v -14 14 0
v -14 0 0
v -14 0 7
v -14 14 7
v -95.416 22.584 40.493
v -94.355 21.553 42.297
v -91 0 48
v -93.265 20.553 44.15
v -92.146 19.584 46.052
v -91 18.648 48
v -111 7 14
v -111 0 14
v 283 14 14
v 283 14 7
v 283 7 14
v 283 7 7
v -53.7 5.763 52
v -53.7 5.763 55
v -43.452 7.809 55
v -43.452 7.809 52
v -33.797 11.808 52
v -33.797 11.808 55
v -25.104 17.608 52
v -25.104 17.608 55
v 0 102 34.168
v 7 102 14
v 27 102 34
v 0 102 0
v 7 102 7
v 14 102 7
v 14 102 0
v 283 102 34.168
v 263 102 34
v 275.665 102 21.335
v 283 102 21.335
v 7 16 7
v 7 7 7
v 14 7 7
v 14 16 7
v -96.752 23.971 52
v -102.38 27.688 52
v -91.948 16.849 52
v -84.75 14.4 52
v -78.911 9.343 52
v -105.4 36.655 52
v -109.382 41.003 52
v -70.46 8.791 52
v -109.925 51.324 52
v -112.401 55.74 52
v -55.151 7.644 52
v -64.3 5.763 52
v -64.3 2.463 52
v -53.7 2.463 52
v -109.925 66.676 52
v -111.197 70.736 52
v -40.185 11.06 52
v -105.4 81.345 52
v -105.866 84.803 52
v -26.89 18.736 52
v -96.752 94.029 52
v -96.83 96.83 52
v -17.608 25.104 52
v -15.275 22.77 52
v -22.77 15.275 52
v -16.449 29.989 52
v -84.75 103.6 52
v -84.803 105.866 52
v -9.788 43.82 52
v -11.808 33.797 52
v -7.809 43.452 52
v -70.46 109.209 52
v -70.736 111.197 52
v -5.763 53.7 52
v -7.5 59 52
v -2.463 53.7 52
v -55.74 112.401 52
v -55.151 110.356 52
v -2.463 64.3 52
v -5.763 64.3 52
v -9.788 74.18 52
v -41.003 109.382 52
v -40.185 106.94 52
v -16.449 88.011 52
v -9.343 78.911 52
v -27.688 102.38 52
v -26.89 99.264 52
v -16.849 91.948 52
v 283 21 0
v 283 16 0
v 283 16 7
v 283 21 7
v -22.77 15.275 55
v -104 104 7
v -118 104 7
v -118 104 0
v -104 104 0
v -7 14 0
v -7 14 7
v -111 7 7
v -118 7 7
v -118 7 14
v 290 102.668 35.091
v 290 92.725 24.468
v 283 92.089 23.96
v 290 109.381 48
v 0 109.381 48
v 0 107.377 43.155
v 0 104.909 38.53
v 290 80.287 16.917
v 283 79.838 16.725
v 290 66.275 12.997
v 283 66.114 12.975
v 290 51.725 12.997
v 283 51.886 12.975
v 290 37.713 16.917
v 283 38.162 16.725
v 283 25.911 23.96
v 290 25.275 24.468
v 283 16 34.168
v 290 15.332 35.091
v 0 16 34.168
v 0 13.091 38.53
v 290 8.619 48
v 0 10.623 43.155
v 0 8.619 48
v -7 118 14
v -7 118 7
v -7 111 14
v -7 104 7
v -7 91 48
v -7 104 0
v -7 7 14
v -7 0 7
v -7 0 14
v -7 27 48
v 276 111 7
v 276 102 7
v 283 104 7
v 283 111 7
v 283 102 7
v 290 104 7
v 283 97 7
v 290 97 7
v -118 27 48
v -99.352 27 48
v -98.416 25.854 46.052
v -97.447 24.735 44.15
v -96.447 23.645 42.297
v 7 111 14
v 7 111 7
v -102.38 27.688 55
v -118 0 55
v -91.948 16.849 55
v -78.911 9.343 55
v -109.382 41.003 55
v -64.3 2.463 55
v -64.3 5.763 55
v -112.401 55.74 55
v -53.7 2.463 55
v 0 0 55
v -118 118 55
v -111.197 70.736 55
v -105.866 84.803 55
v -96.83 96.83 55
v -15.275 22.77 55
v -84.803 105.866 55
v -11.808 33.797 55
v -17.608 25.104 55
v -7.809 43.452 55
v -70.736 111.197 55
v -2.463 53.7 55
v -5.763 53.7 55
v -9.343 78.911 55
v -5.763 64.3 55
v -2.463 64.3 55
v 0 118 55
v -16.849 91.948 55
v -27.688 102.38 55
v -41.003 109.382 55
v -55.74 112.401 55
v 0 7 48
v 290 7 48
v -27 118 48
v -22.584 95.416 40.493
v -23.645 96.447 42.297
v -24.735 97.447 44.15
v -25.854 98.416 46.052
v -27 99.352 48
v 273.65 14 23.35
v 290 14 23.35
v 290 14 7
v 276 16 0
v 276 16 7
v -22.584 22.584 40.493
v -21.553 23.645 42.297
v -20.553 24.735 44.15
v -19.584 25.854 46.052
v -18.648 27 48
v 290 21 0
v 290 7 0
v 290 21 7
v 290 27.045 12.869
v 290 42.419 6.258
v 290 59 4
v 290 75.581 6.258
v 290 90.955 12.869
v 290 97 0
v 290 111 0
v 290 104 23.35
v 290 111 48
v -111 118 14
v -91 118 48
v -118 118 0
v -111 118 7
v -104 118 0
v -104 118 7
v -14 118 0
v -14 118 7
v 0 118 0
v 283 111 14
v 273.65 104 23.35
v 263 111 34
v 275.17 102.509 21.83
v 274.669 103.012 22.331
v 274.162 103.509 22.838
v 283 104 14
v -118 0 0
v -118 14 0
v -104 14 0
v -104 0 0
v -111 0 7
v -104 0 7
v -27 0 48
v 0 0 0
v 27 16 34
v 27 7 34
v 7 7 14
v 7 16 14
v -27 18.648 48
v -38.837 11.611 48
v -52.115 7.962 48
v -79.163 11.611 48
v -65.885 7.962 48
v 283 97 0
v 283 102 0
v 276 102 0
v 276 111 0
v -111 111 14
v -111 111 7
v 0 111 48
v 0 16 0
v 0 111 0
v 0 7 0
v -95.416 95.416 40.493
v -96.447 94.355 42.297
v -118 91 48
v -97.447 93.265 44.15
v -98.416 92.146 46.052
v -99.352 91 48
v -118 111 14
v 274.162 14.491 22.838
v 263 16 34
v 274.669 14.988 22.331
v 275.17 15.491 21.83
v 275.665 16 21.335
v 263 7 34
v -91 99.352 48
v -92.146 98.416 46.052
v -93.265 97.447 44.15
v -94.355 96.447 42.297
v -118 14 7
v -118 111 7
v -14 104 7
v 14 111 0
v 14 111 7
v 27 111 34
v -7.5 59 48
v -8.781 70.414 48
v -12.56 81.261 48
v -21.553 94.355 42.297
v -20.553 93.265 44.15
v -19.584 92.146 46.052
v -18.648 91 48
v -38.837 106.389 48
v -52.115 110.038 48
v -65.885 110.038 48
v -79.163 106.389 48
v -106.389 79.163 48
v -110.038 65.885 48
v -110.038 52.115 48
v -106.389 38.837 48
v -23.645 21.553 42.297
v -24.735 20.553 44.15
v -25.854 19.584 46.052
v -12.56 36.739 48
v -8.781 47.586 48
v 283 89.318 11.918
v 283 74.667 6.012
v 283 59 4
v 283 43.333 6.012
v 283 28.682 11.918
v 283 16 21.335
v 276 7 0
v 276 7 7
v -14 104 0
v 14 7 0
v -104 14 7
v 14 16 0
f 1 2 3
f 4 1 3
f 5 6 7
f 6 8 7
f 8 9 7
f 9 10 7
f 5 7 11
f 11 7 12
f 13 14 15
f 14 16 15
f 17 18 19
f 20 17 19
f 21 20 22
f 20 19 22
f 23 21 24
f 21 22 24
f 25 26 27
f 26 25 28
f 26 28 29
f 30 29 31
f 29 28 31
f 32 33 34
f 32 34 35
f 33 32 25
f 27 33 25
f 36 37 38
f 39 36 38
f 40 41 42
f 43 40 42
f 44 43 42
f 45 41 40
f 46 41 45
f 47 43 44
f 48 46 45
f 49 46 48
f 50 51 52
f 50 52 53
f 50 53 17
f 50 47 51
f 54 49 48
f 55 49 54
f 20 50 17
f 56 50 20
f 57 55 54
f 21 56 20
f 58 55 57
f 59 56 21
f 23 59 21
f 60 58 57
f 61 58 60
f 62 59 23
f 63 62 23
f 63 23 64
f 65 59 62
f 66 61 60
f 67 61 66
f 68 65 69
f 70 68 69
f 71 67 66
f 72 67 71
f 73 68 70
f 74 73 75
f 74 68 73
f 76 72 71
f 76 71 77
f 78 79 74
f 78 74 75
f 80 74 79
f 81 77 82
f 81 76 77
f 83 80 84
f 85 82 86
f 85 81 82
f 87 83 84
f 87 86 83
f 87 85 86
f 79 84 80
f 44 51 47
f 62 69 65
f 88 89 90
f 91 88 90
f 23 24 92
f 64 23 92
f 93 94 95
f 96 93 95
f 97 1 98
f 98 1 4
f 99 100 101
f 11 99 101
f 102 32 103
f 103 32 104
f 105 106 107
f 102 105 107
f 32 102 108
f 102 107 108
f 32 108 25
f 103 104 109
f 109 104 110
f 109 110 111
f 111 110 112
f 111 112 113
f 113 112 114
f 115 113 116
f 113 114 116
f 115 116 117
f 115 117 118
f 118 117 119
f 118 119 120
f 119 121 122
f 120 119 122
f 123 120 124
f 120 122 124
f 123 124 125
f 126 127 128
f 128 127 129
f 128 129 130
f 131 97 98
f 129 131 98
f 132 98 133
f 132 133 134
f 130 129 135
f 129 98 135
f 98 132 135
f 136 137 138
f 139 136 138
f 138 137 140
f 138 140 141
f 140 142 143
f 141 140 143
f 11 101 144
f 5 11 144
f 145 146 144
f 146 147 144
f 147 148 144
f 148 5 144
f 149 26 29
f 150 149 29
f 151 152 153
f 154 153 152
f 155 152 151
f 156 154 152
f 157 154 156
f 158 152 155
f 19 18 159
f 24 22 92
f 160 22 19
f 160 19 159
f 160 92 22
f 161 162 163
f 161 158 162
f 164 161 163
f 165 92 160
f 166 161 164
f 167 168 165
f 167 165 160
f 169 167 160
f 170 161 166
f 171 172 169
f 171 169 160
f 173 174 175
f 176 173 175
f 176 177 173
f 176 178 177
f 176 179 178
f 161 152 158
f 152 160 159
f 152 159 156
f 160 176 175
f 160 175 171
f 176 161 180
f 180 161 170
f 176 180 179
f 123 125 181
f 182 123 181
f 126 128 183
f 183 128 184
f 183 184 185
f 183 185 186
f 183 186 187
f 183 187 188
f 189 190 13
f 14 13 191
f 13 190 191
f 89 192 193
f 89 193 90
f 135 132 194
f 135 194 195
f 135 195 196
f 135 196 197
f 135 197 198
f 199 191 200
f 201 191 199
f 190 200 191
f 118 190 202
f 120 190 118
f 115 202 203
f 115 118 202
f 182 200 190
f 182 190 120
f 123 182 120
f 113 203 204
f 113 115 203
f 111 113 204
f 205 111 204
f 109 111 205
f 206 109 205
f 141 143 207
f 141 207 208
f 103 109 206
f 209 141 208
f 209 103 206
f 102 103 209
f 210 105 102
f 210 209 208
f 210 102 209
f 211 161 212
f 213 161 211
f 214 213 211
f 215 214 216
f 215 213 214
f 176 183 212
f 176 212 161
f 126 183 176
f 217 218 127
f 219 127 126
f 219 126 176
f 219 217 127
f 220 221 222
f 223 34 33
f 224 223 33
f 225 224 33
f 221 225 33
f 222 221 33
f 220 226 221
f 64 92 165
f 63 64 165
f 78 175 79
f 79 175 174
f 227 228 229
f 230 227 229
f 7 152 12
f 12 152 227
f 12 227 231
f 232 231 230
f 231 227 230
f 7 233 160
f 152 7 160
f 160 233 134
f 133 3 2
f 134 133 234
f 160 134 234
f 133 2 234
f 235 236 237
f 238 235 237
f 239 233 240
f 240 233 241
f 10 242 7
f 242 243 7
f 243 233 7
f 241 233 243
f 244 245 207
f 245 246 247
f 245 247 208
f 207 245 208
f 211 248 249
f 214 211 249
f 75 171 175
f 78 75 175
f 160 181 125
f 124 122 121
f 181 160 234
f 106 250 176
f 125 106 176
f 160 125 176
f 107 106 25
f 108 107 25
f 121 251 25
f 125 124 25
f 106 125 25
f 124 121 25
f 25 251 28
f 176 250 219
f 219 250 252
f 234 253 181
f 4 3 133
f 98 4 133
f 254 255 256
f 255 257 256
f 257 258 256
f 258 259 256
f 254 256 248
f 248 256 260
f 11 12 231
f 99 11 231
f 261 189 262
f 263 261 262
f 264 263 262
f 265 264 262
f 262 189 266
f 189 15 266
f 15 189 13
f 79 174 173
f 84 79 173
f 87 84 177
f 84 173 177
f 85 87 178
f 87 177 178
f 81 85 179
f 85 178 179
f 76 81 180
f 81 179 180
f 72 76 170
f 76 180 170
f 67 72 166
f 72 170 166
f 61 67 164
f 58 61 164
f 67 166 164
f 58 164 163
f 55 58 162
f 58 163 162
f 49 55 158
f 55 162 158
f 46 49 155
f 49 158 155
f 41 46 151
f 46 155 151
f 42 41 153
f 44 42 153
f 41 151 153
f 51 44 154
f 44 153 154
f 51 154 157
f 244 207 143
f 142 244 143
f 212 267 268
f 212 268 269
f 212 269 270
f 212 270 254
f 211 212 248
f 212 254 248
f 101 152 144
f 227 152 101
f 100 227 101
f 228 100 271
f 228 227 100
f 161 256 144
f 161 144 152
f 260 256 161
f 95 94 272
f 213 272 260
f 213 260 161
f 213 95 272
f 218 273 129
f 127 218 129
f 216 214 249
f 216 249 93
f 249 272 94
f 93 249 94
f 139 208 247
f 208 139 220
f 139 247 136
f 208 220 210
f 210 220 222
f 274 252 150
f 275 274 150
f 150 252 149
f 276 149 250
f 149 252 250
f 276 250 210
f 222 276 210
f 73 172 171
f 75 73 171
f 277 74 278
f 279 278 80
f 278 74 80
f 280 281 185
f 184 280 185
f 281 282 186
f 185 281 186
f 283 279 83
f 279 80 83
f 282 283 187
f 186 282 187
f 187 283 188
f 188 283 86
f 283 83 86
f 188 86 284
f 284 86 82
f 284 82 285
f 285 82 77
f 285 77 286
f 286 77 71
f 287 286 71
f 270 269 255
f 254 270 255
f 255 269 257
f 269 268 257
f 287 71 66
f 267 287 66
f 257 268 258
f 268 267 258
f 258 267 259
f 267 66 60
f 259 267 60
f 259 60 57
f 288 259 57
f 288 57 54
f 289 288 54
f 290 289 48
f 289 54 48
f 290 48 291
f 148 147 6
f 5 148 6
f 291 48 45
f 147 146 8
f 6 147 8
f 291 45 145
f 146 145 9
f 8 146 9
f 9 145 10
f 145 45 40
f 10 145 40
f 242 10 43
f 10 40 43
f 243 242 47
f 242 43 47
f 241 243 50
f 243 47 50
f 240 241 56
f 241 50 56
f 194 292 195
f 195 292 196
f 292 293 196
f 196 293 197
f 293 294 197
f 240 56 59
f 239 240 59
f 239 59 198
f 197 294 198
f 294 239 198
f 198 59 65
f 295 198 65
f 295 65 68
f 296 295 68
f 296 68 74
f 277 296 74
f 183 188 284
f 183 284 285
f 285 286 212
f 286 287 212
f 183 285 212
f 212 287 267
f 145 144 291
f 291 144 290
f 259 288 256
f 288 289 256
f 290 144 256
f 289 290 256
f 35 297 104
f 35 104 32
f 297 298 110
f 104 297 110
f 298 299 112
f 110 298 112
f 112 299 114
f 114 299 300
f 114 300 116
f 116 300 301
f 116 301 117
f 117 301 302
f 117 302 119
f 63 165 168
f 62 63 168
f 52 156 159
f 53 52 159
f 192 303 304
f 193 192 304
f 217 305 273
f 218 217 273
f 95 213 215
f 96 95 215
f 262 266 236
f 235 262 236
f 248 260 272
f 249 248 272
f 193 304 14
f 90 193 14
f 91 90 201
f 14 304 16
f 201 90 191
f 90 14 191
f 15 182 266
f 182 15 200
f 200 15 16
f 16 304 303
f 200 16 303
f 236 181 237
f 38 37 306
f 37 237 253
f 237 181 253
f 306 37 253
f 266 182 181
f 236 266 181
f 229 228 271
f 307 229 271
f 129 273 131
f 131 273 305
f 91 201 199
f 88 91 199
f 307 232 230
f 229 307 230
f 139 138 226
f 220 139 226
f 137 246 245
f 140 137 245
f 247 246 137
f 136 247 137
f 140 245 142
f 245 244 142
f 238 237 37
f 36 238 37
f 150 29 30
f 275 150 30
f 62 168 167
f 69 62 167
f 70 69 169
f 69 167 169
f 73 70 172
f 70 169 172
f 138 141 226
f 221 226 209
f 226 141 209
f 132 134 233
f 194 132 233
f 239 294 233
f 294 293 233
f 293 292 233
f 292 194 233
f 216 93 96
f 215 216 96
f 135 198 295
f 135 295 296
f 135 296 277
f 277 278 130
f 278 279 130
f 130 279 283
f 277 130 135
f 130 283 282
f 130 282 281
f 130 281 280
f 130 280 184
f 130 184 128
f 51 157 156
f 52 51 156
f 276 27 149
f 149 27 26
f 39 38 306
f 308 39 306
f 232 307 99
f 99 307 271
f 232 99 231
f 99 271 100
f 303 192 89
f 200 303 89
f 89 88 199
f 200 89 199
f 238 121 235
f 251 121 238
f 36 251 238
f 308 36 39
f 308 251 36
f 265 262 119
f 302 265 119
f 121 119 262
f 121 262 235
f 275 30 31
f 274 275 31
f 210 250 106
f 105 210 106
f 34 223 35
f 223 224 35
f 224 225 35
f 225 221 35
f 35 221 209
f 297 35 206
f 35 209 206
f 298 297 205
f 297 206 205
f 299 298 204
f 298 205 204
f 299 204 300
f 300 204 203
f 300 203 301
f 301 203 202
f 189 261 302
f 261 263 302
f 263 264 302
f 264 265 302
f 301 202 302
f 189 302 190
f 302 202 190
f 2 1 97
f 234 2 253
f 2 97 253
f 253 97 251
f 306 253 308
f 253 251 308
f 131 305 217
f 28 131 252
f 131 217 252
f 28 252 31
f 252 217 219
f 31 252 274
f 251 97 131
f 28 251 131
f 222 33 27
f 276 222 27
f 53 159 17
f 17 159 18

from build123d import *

# Parameters (mm, degrees)
F0_W      = 118
F0_H      = 118
F1_DEPTH  = 55
F3_DEPTH  = 3
F4_R      = 51.5
F5_DEPTH  = 100
F7_DEPTH  = 150
F9_DEPTH  = 111
F11_DEPTH = 290
F12_W     = 283
F12_H     = 86
F13_DEPTH = 50
F15_DEPTH = 150
F17_DEPTH = 25


with BuildPart() as f1:
    # F0 (on Top) → F1 (new body)
    with BuildSketch(Plane.XY):
        with Locations((-59, 59)):
            Rectangle(F0_W, F0_H)
    extrude(amount=F1_DEPTH)

    # F2 (on face) → F3 (cut)
    with BuildSketch(Plane.XY.offset(55)):
        with BuildLine():
            Line((-59, 59), (-5.5, 59))
            ThreePointArc((-5.5, 59), (-5.565833, 61.653265), (-5.763171, 64.3))
            ThreePointArc((-5.763171, 64.3), (-96.830213, 96.830213), (-64.3, 5.763171))
            ThreePointArc((-64.3, 5.763171), (-61.653265, 5.565833), (-59, 5.5))
            Line((-59, 5.5), (-59, 59))
        make_face()
        with BuildLine():
            ThreePointArc((-59, 5.5), (-61.653265, 5.565833), (-64.3, 5.763171))
            Line((-64.3, 5.763171), (-64.3, 2.463171))
            Line((-64.3, 2.463171), (-53.7, 2.463171))
            Line((-53.7, 2.463171), (-53.7, 5.763171))
            ThreePointArc((-53.7, 5.763171), (-56.346735, 5.565833), (-59, 5.5))
        make_face()
        with BuildLine():
            Line((-21.169787, 21.169787), (-59, 59))
            Line((-59, 59), (-59, 5.5))
            ThreePointArc((-59, 5.5), (-56.346735, 5.565833), (-53.7, 5.763171))
            ThreePointArc((-53.7, 5.763171), (-38.526436, 9.572445), (-25.103543, 17.608211))
            ThreePointArc((-25.103543, 17.608211), (-23.09248, 19.340197), (-21.169787, 21.169787))
        make_face()
        with BuildLine():
            Line((-15.274759, 22.770091), (-17.608211, 25.103543))
            ThreePointArc((-17.608211, 25.103543), (-19.340197, 23.09248), (-21.169787, 21.169787))
            ThreePointArc((-21.169787, 21.169787), (-23.09248, 19.340197), (-25.103543, 17.608211))
            Line((-25.103543, 17.608211), (-22.770091, 15.274759))
            Line((-22.770091, 15.274759), (-15.274759, 22.770091))
        make_face()
        with BuildLine():
            ThreePointArc((-5.763171, 53.7), (-5.565833, 56.346735), (-5.5, 59))
            Line((-5.5, 59), (-59, 59))
            Line((-59, 59), (-21.169787, 21.169787))
            ThreePointArc((-21.169787, 21.169787), (-19.340197, 23.09248), (-17.608211, 25.103543))
            ThreePointArc((-17.608211, 25.103543), (-9.572445, 38.526436), (-5.763171, 53.7))
        make_face()
        with BuildLine():
            ThreePointArc((-5.763171, 64.3), (-5.565833, 61.653265), (-5.5, 59))
            ThreePointArc((-5.5, 59), (-5.565833, 56.346735), (-5.763171, 53.7))
            Line((-5.763171, 53.7), (-2.463171, 53.7))
            Line((-2.463171, 53.7), (-2.463171, 64.3))
            Line((-2.463171, 64.3), (-5.763171, 64.3))
        make_face()
    extrude(amount=-F3_DEPTH, mode=Mode.SUBTRACT)

    # F4 (on face) → F5 (cut)
    with BuildSketch(Plane.XY.offset(52)):
        with Locations((-59, 59)):
            Circle(F4_R)
    extrude(amount=-F5_DEPTH, mode=Mode.SUBTRACT)

    # F6 (on face) → F7 (cut)
    with BuildSketch(Plane.XZ):
        Polygon((-104, 7), (-104, 0), (-14, 0), (-14, 7), (-7, 7), (-7, 14), (-27, 48), (-91, 48), (-111, 14), (-111, 7), align=None)
    extrude(amount=-F7_DEPTH, mode=Mode.SUBTRACT)

    # F8 (on face) → F9 (cut)
    with BuildSketch(Plane(origin=(-118, 0, 0), x_dir=(0, -1, 0), z_dir=(-1, 0, 0))):
        Polygon((-104, 7), (-104, 0), (-14, 0), (-14, 7), (-7, 7), (-7, 14), (-27, 48), (-91, 48), (-111, 14), (-111, 7), align=None)
    extrude(amount=-F9_DEPTH, mode=Mode.SUBTRACT)

    # F10 (on face) → F11 (join)
    with BuildSketch(Plane.YZ):
        with BuildLine():
            Line((7, 48), (7, 0))
            Line((7, 0), (111, 0))
            Line((111, 0), (111, 48))
            Line((111, 48), (109.381048, 48))
            ThreePointArc((109.381048, 48), (59, 12.5), (8.618952, 48))
            Line((8.618952, 48), (7, 48))
        make_face()
    extrude(amount=F11_DEPTH)

    # F12 (on face) → F13 (cut)
    with BuildSketch(Plane(origin=(0, 0, 0), x_dir=(1, 0, 0), z_dir=(0, 0, -1))):
        with Locations((141.5, -59)):
            Rectangle(F12_W, F12_H)
    extrude(amount=-F13_DEPTH, mode=Mode.SUBTRACT)

    # F14 (on face) → F15 (cut)
    with BuildSketch(Plane.XZ.offset(-7)):
        Polygon((14, 7), (14, 0), (276, 0), (276, 7), (283, 7), (283, 14), (263, 34), (27, 34), (7, 14), (7, 7), align=None)
    extrude(amount=-F15_DEPTH, mode=Mode.SUBTRACT)

    # F16 (on face) → F17 (cut)
    with BuildSketch(Plane.YZ.offset(290)):
        with BuildLine():
            ThreePointArc((104, 23.350264), (59, 4), (14, 23.350264))
            Line((14, 23.350264), (14, 7))
            Line((14, 7), (21, 7))
            Line((21, 7), (21, 0))
            Line((21, 0), (97, 0))
            Line((97, 0), (97, 7))
            Line((97, 7), (104, 7))
            Line((104, 7), (104, 23.350264))
        make_face()
    extrude(amount=-F17_DEPTH, mode=Mode.SUBTRACT)


solid = f1.part
